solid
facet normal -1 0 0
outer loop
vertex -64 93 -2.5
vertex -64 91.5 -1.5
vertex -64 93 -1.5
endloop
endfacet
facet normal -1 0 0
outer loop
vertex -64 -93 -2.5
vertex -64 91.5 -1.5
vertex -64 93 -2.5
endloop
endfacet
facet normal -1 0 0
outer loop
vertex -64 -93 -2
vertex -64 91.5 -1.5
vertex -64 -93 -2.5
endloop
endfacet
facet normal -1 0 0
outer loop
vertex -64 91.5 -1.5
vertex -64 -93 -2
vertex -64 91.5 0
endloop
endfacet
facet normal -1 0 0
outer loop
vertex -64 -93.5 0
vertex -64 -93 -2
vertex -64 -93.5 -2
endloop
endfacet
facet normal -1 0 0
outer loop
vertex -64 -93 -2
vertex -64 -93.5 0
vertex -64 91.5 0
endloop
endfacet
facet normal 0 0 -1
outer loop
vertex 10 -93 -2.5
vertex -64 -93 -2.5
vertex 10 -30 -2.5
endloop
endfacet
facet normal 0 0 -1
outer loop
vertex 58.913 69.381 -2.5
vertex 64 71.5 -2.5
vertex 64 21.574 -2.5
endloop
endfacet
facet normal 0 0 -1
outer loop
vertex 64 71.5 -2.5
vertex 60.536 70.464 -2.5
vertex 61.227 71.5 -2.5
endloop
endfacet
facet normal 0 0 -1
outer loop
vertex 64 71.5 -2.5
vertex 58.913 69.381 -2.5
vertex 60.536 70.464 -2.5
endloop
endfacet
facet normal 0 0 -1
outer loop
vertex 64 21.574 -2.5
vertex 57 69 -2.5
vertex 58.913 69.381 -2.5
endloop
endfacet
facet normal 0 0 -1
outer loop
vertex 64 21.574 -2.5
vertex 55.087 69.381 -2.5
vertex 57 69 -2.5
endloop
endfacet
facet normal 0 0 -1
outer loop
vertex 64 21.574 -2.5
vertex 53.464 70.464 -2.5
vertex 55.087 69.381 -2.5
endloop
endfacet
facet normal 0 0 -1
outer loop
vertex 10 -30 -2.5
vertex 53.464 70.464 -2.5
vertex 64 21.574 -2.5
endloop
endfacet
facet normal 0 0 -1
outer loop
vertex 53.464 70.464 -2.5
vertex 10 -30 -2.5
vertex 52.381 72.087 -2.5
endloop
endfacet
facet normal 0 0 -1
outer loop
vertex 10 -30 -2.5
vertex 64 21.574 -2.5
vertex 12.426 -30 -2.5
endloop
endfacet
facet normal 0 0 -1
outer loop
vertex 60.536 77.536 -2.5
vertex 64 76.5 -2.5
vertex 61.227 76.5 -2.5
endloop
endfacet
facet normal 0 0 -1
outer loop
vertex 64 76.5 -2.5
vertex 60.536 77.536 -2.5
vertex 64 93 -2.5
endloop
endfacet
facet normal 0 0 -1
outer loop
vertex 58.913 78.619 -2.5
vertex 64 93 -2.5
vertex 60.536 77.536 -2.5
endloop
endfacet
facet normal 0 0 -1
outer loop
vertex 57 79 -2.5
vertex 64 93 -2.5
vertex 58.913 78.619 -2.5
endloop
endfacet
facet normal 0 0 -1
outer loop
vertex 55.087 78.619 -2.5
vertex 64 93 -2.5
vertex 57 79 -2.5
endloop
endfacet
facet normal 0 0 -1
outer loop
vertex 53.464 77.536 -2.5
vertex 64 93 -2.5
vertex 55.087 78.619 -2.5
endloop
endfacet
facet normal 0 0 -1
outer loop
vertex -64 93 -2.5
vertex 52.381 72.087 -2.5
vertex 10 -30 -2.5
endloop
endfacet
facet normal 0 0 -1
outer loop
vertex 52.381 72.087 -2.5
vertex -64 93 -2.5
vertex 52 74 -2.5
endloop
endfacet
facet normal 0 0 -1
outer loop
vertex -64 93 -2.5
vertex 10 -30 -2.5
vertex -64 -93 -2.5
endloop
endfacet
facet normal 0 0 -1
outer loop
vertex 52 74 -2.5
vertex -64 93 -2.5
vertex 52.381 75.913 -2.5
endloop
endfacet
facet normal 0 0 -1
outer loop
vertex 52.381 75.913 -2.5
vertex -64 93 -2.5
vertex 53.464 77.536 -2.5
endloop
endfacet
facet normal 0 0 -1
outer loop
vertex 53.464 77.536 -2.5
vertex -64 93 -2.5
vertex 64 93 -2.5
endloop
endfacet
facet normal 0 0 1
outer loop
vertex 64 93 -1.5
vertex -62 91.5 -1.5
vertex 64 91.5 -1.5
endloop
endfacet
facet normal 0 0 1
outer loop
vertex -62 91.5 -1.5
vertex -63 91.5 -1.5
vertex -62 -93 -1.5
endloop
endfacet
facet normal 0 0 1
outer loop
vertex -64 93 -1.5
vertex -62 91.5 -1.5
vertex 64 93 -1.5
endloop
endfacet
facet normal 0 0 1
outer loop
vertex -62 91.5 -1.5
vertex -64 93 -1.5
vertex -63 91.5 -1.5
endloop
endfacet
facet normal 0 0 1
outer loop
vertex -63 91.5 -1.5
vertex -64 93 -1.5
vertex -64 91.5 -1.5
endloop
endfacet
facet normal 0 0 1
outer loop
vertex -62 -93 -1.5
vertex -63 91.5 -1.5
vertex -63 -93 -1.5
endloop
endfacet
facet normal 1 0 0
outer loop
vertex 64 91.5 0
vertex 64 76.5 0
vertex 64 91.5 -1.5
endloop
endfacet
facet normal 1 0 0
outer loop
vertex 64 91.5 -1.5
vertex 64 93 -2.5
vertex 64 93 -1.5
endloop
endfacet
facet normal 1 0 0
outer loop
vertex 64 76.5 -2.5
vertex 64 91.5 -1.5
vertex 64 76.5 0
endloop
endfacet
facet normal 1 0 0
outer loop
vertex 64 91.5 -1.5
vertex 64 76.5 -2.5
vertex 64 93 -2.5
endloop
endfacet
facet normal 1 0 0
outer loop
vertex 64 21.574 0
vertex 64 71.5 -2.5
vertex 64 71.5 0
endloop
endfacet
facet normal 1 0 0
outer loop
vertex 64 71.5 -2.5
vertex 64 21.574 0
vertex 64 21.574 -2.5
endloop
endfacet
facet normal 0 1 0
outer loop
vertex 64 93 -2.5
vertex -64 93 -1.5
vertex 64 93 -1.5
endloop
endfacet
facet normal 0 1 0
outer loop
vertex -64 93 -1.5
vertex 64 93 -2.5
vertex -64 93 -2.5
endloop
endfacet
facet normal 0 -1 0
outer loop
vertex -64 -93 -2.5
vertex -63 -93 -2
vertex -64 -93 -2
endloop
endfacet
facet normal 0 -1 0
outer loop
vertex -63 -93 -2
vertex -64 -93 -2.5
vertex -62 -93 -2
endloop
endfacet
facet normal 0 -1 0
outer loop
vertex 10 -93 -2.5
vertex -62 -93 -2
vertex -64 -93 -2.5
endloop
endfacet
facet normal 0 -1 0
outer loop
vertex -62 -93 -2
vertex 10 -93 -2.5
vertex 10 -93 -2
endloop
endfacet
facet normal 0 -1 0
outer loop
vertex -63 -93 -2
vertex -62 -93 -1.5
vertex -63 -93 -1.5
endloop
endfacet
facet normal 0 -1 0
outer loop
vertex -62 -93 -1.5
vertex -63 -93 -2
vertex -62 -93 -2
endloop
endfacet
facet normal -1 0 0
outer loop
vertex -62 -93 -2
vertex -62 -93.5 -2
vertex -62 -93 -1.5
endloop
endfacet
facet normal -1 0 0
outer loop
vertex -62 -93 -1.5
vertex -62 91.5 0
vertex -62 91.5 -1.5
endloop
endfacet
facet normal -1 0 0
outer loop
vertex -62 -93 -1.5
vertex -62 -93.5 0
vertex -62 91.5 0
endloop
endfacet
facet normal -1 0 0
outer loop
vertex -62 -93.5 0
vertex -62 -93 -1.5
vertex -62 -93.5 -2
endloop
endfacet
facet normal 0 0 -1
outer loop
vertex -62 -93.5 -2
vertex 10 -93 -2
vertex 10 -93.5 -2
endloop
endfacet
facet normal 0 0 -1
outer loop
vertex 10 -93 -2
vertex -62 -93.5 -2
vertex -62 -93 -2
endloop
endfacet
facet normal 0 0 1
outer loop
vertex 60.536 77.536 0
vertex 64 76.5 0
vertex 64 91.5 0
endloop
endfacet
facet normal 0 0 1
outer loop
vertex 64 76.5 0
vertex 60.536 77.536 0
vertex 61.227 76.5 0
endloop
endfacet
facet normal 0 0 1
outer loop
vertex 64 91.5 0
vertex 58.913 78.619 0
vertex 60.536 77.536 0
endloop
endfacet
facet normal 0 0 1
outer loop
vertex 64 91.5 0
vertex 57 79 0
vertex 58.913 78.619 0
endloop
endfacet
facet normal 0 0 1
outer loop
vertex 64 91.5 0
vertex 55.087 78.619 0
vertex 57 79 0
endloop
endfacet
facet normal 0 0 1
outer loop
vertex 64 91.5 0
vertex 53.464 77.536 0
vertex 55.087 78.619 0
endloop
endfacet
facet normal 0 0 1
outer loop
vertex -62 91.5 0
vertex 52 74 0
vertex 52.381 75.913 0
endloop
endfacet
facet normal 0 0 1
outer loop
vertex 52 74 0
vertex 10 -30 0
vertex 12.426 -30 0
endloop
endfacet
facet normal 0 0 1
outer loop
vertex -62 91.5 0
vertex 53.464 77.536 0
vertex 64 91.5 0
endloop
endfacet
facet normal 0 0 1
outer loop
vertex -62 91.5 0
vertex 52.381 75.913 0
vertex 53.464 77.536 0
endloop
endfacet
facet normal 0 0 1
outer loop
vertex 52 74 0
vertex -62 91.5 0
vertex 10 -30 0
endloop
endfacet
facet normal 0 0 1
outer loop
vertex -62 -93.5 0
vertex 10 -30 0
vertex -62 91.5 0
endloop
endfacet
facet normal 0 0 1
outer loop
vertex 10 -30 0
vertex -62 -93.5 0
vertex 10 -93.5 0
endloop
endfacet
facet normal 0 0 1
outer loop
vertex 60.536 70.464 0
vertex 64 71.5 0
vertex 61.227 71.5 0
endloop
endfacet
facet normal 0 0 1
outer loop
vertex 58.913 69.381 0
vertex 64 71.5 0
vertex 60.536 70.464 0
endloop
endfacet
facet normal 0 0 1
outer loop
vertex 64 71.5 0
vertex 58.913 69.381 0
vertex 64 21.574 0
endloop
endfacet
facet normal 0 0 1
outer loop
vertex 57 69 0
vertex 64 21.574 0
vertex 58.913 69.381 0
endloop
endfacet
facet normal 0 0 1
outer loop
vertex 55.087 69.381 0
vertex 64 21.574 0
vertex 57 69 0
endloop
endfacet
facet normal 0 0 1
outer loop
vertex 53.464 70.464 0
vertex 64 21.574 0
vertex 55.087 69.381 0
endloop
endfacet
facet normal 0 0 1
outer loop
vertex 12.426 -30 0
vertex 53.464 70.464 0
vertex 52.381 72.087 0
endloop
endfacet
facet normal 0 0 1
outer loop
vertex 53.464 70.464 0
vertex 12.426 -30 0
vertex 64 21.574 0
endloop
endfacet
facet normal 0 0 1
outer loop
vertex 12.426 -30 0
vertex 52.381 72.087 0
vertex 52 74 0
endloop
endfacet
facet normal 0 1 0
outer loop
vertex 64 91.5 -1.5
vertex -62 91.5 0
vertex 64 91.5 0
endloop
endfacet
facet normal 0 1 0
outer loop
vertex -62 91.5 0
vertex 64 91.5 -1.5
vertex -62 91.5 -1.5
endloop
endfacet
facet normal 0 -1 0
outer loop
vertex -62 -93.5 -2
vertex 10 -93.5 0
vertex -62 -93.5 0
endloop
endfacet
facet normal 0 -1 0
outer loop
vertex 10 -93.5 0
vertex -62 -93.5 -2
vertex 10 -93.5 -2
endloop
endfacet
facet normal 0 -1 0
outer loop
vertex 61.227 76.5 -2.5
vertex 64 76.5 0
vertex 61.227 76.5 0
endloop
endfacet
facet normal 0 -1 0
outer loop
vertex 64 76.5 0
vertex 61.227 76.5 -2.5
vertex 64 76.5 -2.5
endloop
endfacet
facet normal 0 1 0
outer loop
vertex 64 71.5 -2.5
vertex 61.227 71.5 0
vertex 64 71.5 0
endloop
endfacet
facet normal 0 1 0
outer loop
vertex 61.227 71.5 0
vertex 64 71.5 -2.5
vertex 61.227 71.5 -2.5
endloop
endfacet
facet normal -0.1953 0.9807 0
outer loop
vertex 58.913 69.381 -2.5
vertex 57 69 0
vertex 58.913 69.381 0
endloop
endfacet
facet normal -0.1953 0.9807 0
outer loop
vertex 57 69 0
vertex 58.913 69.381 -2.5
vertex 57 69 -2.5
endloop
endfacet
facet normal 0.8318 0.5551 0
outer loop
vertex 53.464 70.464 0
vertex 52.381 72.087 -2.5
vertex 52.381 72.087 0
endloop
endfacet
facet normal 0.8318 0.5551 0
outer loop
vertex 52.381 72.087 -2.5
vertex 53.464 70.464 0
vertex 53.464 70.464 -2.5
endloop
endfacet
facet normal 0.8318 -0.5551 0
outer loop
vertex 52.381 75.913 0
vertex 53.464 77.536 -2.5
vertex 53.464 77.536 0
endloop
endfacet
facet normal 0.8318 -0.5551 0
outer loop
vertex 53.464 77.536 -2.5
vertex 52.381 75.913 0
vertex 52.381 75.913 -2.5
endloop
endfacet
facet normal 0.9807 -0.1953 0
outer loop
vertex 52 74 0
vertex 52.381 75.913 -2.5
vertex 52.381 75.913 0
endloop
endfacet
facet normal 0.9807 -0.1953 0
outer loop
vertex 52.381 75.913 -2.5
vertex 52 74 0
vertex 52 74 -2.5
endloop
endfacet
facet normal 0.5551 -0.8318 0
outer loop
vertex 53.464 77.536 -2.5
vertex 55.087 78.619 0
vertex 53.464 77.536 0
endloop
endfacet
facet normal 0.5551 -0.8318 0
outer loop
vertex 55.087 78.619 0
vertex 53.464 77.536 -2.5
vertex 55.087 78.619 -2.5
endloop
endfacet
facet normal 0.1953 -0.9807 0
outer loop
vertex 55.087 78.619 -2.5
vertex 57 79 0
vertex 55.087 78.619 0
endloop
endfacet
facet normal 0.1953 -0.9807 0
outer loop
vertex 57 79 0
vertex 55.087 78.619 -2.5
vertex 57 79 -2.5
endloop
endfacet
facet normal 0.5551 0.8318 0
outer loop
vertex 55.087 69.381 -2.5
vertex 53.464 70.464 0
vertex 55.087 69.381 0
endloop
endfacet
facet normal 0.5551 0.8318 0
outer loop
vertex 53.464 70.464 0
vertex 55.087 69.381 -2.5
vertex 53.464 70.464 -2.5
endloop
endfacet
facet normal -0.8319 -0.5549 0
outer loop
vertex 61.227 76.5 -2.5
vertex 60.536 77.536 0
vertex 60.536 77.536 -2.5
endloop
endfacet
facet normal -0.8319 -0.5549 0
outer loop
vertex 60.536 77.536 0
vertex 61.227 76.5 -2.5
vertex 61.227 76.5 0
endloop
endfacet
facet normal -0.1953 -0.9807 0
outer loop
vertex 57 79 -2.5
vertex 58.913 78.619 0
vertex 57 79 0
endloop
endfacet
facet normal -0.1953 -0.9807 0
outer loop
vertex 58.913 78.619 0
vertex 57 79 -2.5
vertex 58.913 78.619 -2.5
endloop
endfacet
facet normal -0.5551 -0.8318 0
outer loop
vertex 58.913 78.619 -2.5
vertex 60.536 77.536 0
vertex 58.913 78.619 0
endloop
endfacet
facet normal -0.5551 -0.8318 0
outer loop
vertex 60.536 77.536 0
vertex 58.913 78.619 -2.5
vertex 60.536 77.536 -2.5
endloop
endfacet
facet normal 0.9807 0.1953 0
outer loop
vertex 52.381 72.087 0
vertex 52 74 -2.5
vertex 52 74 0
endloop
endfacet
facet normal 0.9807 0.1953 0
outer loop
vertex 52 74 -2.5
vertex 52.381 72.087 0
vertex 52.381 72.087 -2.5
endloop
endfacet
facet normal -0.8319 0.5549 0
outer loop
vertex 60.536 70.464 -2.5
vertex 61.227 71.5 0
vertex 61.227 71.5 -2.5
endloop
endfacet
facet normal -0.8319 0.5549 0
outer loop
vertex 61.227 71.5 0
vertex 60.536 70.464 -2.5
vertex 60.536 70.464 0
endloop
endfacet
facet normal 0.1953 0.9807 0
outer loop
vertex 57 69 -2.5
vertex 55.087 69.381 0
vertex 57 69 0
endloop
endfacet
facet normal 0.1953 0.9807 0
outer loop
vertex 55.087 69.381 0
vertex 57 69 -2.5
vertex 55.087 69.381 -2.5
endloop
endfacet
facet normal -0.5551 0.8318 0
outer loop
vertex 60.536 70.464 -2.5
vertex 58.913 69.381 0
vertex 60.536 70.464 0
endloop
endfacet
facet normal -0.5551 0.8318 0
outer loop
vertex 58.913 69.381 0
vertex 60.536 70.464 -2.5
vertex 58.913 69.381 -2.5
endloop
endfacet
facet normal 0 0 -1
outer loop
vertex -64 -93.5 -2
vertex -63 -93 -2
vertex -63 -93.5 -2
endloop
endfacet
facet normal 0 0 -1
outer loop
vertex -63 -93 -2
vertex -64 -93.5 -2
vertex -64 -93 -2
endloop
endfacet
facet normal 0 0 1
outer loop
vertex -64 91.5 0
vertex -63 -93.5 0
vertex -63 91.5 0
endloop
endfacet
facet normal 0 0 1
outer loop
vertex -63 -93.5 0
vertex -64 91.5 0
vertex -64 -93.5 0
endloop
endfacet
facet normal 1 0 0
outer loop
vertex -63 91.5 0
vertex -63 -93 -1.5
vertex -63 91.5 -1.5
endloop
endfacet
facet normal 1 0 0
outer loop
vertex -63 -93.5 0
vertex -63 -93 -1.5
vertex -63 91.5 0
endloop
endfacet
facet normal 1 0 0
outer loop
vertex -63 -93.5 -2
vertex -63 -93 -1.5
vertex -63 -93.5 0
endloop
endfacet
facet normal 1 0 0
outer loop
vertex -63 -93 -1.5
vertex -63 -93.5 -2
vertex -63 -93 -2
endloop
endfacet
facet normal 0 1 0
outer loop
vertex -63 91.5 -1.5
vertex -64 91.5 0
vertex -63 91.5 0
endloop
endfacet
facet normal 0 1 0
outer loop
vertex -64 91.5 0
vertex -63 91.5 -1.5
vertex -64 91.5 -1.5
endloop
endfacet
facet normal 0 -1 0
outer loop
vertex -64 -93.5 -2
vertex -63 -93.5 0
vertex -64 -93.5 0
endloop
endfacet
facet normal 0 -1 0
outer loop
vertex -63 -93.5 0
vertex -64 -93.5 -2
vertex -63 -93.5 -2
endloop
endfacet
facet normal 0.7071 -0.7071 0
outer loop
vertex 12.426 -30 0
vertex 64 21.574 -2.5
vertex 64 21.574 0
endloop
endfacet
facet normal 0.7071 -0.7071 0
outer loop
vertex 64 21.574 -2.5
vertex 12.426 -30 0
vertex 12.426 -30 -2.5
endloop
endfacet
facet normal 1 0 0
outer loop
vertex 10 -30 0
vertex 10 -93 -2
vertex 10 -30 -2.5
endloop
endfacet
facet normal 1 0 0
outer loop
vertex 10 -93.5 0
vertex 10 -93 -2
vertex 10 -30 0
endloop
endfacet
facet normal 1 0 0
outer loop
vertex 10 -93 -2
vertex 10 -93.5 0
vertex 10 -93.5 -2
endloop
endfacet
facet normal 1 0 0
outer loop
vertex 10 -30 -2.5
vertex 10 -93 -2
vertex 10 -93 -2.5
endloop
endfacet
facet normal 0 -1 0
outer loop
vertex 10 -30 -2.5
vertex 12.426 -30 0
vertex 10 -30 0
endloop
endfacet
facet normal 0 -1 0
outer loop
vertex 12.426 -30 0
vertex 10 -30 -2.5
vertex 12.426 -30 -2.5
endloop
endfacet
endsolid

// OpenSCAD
// file: piece-6-rampe-1.scad
module piece6g(){
    difference(){
        difference(){
            union(){
                cube([84,38,2],center=true);
                translate([0,0,-0.5]){
                    cube([84,39,1],center=true);
                }
            }
            translate([-10,22,0]){
                rotate([0,0,25]){
                    cube([100,50,4],center=true);
                }
            }
        }
        translate([0,-2,0.5]){
            rotate([0,0,25]){
                cube([100,1,1],center=true);
            }
        }
    }
    translate([42,0,0]){cube([10,5,2],center=true);}
    translate([50,0,-1]){cylinder(h=2,r=5);}
}
// main file
include <piece-6-rampe-1.scad>;
difference(){
    rotate([0,180,0]){
         difference(){
            union(){
                translate([0,0,2]){cube([128,186,1],center=true);}
                translate([-1,-1,1]){cube([126,185,2],center=true);}
            }
            union(){
                translate([-107,74,0]) {piece6g();}
                translate([-107,74,1.5]) {piece6g();}
            }
        }
        translate([63.5,-1,1]) {cube([1,185,2],center=true);}
    }
    rotate([0,0,45]){
        translate([30,-75,0]) {
            cube([90,90,8],center=true);
        }
    }
    translate([55,-75,0]) {
        cube([90,90,8],center=true);
    }
}
